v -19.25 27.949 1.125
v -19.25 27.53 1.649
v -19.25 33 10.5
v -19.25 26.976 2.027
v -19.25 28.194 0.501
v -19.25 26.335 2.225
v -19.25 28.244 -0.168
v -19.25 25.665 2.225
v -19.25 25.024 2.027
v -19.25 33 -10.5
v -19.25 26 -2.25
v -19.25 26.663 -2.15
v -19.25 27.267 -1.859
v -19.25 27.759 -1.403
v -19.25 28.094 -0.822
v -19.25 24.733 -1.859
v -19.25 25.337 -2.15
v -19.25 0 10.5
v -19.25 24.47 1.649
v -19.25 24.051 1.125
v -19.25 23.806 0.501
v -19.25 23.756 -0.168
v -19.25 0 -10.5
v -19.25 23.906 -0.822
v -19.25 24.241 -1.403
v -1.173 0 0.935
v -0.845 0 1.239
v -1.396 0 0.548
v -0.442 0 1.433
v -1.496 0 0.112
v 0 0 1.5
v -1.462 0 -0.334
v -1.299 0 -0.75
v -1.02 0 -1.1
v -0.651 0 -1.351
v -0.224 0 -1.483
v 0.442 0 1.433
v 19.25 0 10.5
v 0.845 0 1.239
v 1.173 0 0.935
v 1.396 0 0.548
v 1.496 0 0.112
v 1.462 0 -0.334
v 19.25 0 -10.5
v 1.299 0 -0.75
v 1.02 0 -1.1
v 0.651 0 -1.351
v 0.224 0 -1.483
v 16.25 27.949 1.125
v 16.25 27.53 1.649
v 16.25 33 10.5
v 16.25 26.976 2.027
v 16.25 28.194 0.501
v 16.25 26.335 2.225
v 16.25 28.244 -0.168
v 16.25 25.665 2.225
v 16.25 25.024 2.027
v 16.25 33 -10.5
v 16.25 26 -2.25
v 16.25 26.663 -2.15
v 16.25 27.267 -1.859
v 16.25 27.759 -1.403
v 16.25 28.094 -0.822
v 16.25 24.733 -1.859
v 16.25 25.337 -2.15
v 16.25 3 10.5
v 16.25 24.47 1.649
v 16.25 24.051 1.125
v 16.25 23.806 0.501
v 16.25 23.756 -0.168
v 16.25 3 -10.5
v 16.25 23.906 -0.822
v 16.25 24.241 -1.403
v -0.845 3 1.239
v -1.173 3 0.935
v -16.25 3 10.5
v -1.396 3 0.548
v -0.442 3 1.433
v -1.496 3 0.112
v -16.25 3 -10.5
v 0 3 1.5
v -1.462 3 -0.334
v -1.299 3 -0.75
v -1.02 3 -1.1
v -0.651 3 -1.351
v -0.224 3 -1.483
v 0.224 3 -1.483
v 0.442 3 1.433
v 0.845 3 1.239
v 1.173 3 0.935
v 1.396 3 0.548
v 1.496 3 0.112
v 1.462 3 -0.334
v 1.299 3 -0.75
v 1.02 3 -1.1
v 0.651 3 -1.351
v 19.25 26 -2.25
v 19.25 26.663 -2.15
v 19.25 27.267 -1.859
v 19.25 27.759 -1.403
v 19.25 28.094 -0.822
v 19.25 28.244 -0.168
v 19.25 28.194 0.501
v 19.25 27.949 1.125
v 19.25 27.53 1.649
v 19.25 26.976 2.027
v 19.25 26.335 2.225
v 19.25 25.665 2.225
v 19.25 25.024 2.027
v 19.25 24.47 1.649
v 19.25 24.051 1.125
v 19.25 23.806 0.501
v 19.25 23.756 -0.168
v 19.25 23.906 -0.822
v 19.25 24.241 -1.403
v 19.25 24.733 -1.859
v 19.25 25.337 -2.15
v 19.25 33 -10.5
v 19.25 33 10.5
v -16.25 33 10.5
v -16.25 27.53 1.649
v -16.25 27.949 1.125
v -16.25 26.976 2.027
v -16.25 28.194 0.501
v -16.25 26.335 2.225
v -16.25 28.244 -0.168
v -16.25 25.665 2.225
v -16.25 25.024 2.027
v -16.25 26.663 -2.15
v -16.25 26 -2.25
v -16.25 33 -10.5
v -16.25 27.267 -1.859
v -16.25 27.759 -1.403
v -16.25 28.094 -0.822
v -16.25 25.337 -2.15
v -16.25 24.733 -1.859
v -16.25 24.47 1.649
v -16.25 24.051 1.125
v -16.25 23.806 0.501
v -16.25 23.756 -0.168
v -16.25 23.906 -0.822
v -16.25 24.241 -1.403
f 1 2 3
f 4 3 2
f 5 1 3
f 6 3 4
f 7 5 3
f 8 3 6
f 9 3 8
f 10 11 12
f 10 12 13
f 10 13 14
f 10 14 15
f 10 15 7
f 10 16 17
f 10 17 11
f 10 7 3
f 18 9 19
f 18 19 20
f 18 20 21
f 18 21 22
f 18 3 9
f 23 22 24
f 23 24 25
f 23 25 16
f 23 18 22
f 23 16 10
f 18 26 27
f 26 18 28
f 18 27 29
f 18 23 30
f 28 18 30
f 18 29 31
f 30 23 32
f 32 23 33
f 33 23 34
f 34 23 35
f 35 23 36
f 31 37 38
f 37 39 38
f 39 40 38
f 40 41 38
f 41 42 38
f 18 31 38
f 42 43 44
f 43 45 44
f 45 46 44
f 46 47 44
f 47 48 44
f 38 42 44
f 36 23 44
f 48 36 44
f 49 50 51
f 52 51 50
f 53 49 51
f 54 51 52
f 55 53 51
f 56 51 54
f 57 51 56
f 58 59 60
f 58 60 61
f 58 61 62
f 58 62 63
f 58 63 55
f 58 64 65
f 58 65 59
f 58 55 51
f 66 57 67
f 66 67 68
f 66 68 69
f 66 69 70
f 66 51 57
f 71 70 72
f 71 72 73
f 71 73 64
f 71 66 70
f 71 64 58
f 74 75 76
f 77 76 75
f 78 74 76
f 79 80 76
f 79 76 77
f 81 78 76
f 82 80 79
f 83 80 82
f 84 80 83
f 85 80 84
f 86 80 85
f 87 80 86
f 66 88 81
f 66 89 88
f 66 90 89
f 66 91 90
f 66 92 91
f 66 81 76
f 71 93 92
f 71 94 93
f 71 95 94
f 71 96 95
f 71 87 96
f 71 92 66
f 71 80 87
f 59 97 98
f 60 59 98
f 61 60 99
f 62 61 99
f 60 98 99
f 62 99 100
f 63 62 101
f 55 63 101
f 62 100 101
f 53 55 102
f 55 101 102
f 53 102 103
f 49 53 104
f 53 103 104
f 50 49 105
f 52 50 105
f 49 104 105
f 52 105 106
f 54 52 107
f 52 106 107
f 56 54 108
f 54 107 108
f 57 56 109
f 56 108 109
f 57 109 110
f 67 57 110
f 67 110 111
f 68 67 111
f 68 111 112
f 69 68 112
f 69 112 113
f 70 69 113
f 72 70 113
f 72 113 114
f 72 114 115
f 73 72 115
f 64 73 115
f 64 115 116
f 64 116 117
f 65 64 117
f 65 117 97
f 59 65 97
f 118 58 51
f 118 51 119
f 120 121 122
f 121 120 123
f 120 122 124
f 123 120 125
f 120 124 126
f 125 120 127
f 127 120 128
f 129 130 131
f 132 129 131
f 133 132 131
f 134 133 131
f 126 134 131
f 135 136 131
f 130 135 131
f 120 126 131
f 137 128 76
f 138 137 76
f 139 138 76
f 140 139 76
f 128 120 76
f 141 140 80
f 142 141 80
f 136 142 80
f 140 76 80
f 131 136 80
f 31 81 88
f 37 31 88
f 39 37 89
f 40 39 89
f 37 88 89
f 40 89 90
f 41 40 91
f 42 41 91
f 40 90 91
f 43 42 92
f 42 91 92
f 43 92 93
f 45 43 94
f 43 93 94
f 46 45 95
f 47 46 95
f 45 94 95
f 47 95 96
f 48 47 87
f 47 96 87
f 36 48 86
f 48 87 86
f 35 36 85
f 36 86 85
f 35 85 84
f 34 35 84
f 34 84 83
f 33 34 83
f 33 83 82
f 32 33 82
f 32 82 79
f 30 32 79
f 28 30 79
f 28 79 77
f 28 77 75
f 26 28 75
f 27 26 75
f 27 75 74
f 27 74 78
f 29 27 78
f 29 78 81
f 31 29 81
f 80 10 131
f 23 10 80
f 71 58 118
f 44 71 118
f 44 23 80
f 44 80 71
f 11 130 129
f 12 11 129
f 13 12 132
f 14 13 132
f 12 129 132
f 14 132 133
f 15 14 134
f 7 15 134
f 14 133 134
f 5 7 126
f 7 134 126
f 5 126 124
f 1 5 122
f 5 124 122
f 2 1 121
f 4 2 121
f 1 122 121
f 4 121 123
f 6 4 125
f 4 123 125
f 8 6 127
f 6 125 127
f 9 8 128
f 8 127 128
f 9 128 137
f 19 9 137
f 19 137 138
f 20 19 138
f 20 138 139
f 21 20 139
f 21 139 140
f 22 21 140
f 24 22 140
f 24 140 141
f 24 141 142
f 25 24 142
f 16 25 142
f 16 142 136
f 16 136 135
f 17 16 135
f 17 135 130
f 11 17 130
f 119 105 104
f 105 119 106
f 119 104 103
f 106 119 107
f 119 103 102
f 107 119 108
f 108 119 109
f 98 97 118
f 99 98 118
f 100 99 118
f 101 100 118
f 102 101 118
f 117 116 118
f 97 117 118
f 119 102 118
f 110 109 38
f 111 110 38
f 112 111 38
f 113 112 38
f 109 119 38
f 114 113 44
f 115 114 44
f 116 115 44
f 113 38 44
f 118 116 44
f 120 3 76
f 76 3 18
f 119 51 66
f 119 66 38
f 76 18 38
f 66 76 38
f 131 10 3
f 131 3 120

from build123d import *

# Parameters (mm, degrees)
SKETCH1_W           = 32.5
SKETCH1_H           = 21
BOSS_EXTRUDE1_DEPTH = 3
SKETCH1_3_W         = 3
SKETCH1_3_H         = 21
BOSS_EXTRUDE2_DEPTH = 33
SKETCH2_R           = 2.25
CUT_EXTRUDE1_DEPTH  = 52.783201909
SKETCH3_R           = 1.5
CUT_EXTRUDE2_DEPTH  = 38.159285515


with BuildPart() as part:
    # Sketch1 → Boss-Extrude1 (new body)
    with BuildSketch(Plane(origin=(0, 0, 0), x_dir=(1, 0, 0), z_dir=(0, 1, 0))):
        Rectangle(SKETCH1_W, SKETCH1_H)
    extrude(amount=BOSS_EXTRUDE1_DEPTH)

    # Sketch1<3> → Boss-Extrude2 (add)
    with BuildSketch(Plane(origin=(0, 0, 0), x_dir=(1, 0, 0), z_dir=(0, 1, 0))):
        with Locations((-17.75, 0)):
            Rectangle(SKETCH1_3_W, SKETCH1_3_H)
        with Locations((17.75, 0)):
            Rectangle(SKETCH1_3_W, SKETCH1_3_H)
    extrude(amount=BOSS_EXTRUDE2_DEPTH)

    # Sketch2 → Cut-Extrude1 (cut, through all)
    with BuildSketch(Plane(origin=(19.25, 0, 0), x_dir=(0, 0, -1), z_dir=(1, 0, 0))):
        with Locations((0, 26)):
            Circle(SKETCH2_R)
    extrude(amount=-CUT_EXTRUDE1_DEPTH, mode=Mode.SUBTRACT)

    # Sketch3 → Cut-Extrude2 (cut, through all)
    with BuildSketch(Plane(origin=(0, 3, 0), x_dir=(1, 0, 0), z_dir=(0, 1, 0))):
        Circle(SKETCH3_R)
    extrude(amount=-CUT_EXTRUDE2_DEPTH, mode=Mode.SUBTRACT)


solid = part.part
